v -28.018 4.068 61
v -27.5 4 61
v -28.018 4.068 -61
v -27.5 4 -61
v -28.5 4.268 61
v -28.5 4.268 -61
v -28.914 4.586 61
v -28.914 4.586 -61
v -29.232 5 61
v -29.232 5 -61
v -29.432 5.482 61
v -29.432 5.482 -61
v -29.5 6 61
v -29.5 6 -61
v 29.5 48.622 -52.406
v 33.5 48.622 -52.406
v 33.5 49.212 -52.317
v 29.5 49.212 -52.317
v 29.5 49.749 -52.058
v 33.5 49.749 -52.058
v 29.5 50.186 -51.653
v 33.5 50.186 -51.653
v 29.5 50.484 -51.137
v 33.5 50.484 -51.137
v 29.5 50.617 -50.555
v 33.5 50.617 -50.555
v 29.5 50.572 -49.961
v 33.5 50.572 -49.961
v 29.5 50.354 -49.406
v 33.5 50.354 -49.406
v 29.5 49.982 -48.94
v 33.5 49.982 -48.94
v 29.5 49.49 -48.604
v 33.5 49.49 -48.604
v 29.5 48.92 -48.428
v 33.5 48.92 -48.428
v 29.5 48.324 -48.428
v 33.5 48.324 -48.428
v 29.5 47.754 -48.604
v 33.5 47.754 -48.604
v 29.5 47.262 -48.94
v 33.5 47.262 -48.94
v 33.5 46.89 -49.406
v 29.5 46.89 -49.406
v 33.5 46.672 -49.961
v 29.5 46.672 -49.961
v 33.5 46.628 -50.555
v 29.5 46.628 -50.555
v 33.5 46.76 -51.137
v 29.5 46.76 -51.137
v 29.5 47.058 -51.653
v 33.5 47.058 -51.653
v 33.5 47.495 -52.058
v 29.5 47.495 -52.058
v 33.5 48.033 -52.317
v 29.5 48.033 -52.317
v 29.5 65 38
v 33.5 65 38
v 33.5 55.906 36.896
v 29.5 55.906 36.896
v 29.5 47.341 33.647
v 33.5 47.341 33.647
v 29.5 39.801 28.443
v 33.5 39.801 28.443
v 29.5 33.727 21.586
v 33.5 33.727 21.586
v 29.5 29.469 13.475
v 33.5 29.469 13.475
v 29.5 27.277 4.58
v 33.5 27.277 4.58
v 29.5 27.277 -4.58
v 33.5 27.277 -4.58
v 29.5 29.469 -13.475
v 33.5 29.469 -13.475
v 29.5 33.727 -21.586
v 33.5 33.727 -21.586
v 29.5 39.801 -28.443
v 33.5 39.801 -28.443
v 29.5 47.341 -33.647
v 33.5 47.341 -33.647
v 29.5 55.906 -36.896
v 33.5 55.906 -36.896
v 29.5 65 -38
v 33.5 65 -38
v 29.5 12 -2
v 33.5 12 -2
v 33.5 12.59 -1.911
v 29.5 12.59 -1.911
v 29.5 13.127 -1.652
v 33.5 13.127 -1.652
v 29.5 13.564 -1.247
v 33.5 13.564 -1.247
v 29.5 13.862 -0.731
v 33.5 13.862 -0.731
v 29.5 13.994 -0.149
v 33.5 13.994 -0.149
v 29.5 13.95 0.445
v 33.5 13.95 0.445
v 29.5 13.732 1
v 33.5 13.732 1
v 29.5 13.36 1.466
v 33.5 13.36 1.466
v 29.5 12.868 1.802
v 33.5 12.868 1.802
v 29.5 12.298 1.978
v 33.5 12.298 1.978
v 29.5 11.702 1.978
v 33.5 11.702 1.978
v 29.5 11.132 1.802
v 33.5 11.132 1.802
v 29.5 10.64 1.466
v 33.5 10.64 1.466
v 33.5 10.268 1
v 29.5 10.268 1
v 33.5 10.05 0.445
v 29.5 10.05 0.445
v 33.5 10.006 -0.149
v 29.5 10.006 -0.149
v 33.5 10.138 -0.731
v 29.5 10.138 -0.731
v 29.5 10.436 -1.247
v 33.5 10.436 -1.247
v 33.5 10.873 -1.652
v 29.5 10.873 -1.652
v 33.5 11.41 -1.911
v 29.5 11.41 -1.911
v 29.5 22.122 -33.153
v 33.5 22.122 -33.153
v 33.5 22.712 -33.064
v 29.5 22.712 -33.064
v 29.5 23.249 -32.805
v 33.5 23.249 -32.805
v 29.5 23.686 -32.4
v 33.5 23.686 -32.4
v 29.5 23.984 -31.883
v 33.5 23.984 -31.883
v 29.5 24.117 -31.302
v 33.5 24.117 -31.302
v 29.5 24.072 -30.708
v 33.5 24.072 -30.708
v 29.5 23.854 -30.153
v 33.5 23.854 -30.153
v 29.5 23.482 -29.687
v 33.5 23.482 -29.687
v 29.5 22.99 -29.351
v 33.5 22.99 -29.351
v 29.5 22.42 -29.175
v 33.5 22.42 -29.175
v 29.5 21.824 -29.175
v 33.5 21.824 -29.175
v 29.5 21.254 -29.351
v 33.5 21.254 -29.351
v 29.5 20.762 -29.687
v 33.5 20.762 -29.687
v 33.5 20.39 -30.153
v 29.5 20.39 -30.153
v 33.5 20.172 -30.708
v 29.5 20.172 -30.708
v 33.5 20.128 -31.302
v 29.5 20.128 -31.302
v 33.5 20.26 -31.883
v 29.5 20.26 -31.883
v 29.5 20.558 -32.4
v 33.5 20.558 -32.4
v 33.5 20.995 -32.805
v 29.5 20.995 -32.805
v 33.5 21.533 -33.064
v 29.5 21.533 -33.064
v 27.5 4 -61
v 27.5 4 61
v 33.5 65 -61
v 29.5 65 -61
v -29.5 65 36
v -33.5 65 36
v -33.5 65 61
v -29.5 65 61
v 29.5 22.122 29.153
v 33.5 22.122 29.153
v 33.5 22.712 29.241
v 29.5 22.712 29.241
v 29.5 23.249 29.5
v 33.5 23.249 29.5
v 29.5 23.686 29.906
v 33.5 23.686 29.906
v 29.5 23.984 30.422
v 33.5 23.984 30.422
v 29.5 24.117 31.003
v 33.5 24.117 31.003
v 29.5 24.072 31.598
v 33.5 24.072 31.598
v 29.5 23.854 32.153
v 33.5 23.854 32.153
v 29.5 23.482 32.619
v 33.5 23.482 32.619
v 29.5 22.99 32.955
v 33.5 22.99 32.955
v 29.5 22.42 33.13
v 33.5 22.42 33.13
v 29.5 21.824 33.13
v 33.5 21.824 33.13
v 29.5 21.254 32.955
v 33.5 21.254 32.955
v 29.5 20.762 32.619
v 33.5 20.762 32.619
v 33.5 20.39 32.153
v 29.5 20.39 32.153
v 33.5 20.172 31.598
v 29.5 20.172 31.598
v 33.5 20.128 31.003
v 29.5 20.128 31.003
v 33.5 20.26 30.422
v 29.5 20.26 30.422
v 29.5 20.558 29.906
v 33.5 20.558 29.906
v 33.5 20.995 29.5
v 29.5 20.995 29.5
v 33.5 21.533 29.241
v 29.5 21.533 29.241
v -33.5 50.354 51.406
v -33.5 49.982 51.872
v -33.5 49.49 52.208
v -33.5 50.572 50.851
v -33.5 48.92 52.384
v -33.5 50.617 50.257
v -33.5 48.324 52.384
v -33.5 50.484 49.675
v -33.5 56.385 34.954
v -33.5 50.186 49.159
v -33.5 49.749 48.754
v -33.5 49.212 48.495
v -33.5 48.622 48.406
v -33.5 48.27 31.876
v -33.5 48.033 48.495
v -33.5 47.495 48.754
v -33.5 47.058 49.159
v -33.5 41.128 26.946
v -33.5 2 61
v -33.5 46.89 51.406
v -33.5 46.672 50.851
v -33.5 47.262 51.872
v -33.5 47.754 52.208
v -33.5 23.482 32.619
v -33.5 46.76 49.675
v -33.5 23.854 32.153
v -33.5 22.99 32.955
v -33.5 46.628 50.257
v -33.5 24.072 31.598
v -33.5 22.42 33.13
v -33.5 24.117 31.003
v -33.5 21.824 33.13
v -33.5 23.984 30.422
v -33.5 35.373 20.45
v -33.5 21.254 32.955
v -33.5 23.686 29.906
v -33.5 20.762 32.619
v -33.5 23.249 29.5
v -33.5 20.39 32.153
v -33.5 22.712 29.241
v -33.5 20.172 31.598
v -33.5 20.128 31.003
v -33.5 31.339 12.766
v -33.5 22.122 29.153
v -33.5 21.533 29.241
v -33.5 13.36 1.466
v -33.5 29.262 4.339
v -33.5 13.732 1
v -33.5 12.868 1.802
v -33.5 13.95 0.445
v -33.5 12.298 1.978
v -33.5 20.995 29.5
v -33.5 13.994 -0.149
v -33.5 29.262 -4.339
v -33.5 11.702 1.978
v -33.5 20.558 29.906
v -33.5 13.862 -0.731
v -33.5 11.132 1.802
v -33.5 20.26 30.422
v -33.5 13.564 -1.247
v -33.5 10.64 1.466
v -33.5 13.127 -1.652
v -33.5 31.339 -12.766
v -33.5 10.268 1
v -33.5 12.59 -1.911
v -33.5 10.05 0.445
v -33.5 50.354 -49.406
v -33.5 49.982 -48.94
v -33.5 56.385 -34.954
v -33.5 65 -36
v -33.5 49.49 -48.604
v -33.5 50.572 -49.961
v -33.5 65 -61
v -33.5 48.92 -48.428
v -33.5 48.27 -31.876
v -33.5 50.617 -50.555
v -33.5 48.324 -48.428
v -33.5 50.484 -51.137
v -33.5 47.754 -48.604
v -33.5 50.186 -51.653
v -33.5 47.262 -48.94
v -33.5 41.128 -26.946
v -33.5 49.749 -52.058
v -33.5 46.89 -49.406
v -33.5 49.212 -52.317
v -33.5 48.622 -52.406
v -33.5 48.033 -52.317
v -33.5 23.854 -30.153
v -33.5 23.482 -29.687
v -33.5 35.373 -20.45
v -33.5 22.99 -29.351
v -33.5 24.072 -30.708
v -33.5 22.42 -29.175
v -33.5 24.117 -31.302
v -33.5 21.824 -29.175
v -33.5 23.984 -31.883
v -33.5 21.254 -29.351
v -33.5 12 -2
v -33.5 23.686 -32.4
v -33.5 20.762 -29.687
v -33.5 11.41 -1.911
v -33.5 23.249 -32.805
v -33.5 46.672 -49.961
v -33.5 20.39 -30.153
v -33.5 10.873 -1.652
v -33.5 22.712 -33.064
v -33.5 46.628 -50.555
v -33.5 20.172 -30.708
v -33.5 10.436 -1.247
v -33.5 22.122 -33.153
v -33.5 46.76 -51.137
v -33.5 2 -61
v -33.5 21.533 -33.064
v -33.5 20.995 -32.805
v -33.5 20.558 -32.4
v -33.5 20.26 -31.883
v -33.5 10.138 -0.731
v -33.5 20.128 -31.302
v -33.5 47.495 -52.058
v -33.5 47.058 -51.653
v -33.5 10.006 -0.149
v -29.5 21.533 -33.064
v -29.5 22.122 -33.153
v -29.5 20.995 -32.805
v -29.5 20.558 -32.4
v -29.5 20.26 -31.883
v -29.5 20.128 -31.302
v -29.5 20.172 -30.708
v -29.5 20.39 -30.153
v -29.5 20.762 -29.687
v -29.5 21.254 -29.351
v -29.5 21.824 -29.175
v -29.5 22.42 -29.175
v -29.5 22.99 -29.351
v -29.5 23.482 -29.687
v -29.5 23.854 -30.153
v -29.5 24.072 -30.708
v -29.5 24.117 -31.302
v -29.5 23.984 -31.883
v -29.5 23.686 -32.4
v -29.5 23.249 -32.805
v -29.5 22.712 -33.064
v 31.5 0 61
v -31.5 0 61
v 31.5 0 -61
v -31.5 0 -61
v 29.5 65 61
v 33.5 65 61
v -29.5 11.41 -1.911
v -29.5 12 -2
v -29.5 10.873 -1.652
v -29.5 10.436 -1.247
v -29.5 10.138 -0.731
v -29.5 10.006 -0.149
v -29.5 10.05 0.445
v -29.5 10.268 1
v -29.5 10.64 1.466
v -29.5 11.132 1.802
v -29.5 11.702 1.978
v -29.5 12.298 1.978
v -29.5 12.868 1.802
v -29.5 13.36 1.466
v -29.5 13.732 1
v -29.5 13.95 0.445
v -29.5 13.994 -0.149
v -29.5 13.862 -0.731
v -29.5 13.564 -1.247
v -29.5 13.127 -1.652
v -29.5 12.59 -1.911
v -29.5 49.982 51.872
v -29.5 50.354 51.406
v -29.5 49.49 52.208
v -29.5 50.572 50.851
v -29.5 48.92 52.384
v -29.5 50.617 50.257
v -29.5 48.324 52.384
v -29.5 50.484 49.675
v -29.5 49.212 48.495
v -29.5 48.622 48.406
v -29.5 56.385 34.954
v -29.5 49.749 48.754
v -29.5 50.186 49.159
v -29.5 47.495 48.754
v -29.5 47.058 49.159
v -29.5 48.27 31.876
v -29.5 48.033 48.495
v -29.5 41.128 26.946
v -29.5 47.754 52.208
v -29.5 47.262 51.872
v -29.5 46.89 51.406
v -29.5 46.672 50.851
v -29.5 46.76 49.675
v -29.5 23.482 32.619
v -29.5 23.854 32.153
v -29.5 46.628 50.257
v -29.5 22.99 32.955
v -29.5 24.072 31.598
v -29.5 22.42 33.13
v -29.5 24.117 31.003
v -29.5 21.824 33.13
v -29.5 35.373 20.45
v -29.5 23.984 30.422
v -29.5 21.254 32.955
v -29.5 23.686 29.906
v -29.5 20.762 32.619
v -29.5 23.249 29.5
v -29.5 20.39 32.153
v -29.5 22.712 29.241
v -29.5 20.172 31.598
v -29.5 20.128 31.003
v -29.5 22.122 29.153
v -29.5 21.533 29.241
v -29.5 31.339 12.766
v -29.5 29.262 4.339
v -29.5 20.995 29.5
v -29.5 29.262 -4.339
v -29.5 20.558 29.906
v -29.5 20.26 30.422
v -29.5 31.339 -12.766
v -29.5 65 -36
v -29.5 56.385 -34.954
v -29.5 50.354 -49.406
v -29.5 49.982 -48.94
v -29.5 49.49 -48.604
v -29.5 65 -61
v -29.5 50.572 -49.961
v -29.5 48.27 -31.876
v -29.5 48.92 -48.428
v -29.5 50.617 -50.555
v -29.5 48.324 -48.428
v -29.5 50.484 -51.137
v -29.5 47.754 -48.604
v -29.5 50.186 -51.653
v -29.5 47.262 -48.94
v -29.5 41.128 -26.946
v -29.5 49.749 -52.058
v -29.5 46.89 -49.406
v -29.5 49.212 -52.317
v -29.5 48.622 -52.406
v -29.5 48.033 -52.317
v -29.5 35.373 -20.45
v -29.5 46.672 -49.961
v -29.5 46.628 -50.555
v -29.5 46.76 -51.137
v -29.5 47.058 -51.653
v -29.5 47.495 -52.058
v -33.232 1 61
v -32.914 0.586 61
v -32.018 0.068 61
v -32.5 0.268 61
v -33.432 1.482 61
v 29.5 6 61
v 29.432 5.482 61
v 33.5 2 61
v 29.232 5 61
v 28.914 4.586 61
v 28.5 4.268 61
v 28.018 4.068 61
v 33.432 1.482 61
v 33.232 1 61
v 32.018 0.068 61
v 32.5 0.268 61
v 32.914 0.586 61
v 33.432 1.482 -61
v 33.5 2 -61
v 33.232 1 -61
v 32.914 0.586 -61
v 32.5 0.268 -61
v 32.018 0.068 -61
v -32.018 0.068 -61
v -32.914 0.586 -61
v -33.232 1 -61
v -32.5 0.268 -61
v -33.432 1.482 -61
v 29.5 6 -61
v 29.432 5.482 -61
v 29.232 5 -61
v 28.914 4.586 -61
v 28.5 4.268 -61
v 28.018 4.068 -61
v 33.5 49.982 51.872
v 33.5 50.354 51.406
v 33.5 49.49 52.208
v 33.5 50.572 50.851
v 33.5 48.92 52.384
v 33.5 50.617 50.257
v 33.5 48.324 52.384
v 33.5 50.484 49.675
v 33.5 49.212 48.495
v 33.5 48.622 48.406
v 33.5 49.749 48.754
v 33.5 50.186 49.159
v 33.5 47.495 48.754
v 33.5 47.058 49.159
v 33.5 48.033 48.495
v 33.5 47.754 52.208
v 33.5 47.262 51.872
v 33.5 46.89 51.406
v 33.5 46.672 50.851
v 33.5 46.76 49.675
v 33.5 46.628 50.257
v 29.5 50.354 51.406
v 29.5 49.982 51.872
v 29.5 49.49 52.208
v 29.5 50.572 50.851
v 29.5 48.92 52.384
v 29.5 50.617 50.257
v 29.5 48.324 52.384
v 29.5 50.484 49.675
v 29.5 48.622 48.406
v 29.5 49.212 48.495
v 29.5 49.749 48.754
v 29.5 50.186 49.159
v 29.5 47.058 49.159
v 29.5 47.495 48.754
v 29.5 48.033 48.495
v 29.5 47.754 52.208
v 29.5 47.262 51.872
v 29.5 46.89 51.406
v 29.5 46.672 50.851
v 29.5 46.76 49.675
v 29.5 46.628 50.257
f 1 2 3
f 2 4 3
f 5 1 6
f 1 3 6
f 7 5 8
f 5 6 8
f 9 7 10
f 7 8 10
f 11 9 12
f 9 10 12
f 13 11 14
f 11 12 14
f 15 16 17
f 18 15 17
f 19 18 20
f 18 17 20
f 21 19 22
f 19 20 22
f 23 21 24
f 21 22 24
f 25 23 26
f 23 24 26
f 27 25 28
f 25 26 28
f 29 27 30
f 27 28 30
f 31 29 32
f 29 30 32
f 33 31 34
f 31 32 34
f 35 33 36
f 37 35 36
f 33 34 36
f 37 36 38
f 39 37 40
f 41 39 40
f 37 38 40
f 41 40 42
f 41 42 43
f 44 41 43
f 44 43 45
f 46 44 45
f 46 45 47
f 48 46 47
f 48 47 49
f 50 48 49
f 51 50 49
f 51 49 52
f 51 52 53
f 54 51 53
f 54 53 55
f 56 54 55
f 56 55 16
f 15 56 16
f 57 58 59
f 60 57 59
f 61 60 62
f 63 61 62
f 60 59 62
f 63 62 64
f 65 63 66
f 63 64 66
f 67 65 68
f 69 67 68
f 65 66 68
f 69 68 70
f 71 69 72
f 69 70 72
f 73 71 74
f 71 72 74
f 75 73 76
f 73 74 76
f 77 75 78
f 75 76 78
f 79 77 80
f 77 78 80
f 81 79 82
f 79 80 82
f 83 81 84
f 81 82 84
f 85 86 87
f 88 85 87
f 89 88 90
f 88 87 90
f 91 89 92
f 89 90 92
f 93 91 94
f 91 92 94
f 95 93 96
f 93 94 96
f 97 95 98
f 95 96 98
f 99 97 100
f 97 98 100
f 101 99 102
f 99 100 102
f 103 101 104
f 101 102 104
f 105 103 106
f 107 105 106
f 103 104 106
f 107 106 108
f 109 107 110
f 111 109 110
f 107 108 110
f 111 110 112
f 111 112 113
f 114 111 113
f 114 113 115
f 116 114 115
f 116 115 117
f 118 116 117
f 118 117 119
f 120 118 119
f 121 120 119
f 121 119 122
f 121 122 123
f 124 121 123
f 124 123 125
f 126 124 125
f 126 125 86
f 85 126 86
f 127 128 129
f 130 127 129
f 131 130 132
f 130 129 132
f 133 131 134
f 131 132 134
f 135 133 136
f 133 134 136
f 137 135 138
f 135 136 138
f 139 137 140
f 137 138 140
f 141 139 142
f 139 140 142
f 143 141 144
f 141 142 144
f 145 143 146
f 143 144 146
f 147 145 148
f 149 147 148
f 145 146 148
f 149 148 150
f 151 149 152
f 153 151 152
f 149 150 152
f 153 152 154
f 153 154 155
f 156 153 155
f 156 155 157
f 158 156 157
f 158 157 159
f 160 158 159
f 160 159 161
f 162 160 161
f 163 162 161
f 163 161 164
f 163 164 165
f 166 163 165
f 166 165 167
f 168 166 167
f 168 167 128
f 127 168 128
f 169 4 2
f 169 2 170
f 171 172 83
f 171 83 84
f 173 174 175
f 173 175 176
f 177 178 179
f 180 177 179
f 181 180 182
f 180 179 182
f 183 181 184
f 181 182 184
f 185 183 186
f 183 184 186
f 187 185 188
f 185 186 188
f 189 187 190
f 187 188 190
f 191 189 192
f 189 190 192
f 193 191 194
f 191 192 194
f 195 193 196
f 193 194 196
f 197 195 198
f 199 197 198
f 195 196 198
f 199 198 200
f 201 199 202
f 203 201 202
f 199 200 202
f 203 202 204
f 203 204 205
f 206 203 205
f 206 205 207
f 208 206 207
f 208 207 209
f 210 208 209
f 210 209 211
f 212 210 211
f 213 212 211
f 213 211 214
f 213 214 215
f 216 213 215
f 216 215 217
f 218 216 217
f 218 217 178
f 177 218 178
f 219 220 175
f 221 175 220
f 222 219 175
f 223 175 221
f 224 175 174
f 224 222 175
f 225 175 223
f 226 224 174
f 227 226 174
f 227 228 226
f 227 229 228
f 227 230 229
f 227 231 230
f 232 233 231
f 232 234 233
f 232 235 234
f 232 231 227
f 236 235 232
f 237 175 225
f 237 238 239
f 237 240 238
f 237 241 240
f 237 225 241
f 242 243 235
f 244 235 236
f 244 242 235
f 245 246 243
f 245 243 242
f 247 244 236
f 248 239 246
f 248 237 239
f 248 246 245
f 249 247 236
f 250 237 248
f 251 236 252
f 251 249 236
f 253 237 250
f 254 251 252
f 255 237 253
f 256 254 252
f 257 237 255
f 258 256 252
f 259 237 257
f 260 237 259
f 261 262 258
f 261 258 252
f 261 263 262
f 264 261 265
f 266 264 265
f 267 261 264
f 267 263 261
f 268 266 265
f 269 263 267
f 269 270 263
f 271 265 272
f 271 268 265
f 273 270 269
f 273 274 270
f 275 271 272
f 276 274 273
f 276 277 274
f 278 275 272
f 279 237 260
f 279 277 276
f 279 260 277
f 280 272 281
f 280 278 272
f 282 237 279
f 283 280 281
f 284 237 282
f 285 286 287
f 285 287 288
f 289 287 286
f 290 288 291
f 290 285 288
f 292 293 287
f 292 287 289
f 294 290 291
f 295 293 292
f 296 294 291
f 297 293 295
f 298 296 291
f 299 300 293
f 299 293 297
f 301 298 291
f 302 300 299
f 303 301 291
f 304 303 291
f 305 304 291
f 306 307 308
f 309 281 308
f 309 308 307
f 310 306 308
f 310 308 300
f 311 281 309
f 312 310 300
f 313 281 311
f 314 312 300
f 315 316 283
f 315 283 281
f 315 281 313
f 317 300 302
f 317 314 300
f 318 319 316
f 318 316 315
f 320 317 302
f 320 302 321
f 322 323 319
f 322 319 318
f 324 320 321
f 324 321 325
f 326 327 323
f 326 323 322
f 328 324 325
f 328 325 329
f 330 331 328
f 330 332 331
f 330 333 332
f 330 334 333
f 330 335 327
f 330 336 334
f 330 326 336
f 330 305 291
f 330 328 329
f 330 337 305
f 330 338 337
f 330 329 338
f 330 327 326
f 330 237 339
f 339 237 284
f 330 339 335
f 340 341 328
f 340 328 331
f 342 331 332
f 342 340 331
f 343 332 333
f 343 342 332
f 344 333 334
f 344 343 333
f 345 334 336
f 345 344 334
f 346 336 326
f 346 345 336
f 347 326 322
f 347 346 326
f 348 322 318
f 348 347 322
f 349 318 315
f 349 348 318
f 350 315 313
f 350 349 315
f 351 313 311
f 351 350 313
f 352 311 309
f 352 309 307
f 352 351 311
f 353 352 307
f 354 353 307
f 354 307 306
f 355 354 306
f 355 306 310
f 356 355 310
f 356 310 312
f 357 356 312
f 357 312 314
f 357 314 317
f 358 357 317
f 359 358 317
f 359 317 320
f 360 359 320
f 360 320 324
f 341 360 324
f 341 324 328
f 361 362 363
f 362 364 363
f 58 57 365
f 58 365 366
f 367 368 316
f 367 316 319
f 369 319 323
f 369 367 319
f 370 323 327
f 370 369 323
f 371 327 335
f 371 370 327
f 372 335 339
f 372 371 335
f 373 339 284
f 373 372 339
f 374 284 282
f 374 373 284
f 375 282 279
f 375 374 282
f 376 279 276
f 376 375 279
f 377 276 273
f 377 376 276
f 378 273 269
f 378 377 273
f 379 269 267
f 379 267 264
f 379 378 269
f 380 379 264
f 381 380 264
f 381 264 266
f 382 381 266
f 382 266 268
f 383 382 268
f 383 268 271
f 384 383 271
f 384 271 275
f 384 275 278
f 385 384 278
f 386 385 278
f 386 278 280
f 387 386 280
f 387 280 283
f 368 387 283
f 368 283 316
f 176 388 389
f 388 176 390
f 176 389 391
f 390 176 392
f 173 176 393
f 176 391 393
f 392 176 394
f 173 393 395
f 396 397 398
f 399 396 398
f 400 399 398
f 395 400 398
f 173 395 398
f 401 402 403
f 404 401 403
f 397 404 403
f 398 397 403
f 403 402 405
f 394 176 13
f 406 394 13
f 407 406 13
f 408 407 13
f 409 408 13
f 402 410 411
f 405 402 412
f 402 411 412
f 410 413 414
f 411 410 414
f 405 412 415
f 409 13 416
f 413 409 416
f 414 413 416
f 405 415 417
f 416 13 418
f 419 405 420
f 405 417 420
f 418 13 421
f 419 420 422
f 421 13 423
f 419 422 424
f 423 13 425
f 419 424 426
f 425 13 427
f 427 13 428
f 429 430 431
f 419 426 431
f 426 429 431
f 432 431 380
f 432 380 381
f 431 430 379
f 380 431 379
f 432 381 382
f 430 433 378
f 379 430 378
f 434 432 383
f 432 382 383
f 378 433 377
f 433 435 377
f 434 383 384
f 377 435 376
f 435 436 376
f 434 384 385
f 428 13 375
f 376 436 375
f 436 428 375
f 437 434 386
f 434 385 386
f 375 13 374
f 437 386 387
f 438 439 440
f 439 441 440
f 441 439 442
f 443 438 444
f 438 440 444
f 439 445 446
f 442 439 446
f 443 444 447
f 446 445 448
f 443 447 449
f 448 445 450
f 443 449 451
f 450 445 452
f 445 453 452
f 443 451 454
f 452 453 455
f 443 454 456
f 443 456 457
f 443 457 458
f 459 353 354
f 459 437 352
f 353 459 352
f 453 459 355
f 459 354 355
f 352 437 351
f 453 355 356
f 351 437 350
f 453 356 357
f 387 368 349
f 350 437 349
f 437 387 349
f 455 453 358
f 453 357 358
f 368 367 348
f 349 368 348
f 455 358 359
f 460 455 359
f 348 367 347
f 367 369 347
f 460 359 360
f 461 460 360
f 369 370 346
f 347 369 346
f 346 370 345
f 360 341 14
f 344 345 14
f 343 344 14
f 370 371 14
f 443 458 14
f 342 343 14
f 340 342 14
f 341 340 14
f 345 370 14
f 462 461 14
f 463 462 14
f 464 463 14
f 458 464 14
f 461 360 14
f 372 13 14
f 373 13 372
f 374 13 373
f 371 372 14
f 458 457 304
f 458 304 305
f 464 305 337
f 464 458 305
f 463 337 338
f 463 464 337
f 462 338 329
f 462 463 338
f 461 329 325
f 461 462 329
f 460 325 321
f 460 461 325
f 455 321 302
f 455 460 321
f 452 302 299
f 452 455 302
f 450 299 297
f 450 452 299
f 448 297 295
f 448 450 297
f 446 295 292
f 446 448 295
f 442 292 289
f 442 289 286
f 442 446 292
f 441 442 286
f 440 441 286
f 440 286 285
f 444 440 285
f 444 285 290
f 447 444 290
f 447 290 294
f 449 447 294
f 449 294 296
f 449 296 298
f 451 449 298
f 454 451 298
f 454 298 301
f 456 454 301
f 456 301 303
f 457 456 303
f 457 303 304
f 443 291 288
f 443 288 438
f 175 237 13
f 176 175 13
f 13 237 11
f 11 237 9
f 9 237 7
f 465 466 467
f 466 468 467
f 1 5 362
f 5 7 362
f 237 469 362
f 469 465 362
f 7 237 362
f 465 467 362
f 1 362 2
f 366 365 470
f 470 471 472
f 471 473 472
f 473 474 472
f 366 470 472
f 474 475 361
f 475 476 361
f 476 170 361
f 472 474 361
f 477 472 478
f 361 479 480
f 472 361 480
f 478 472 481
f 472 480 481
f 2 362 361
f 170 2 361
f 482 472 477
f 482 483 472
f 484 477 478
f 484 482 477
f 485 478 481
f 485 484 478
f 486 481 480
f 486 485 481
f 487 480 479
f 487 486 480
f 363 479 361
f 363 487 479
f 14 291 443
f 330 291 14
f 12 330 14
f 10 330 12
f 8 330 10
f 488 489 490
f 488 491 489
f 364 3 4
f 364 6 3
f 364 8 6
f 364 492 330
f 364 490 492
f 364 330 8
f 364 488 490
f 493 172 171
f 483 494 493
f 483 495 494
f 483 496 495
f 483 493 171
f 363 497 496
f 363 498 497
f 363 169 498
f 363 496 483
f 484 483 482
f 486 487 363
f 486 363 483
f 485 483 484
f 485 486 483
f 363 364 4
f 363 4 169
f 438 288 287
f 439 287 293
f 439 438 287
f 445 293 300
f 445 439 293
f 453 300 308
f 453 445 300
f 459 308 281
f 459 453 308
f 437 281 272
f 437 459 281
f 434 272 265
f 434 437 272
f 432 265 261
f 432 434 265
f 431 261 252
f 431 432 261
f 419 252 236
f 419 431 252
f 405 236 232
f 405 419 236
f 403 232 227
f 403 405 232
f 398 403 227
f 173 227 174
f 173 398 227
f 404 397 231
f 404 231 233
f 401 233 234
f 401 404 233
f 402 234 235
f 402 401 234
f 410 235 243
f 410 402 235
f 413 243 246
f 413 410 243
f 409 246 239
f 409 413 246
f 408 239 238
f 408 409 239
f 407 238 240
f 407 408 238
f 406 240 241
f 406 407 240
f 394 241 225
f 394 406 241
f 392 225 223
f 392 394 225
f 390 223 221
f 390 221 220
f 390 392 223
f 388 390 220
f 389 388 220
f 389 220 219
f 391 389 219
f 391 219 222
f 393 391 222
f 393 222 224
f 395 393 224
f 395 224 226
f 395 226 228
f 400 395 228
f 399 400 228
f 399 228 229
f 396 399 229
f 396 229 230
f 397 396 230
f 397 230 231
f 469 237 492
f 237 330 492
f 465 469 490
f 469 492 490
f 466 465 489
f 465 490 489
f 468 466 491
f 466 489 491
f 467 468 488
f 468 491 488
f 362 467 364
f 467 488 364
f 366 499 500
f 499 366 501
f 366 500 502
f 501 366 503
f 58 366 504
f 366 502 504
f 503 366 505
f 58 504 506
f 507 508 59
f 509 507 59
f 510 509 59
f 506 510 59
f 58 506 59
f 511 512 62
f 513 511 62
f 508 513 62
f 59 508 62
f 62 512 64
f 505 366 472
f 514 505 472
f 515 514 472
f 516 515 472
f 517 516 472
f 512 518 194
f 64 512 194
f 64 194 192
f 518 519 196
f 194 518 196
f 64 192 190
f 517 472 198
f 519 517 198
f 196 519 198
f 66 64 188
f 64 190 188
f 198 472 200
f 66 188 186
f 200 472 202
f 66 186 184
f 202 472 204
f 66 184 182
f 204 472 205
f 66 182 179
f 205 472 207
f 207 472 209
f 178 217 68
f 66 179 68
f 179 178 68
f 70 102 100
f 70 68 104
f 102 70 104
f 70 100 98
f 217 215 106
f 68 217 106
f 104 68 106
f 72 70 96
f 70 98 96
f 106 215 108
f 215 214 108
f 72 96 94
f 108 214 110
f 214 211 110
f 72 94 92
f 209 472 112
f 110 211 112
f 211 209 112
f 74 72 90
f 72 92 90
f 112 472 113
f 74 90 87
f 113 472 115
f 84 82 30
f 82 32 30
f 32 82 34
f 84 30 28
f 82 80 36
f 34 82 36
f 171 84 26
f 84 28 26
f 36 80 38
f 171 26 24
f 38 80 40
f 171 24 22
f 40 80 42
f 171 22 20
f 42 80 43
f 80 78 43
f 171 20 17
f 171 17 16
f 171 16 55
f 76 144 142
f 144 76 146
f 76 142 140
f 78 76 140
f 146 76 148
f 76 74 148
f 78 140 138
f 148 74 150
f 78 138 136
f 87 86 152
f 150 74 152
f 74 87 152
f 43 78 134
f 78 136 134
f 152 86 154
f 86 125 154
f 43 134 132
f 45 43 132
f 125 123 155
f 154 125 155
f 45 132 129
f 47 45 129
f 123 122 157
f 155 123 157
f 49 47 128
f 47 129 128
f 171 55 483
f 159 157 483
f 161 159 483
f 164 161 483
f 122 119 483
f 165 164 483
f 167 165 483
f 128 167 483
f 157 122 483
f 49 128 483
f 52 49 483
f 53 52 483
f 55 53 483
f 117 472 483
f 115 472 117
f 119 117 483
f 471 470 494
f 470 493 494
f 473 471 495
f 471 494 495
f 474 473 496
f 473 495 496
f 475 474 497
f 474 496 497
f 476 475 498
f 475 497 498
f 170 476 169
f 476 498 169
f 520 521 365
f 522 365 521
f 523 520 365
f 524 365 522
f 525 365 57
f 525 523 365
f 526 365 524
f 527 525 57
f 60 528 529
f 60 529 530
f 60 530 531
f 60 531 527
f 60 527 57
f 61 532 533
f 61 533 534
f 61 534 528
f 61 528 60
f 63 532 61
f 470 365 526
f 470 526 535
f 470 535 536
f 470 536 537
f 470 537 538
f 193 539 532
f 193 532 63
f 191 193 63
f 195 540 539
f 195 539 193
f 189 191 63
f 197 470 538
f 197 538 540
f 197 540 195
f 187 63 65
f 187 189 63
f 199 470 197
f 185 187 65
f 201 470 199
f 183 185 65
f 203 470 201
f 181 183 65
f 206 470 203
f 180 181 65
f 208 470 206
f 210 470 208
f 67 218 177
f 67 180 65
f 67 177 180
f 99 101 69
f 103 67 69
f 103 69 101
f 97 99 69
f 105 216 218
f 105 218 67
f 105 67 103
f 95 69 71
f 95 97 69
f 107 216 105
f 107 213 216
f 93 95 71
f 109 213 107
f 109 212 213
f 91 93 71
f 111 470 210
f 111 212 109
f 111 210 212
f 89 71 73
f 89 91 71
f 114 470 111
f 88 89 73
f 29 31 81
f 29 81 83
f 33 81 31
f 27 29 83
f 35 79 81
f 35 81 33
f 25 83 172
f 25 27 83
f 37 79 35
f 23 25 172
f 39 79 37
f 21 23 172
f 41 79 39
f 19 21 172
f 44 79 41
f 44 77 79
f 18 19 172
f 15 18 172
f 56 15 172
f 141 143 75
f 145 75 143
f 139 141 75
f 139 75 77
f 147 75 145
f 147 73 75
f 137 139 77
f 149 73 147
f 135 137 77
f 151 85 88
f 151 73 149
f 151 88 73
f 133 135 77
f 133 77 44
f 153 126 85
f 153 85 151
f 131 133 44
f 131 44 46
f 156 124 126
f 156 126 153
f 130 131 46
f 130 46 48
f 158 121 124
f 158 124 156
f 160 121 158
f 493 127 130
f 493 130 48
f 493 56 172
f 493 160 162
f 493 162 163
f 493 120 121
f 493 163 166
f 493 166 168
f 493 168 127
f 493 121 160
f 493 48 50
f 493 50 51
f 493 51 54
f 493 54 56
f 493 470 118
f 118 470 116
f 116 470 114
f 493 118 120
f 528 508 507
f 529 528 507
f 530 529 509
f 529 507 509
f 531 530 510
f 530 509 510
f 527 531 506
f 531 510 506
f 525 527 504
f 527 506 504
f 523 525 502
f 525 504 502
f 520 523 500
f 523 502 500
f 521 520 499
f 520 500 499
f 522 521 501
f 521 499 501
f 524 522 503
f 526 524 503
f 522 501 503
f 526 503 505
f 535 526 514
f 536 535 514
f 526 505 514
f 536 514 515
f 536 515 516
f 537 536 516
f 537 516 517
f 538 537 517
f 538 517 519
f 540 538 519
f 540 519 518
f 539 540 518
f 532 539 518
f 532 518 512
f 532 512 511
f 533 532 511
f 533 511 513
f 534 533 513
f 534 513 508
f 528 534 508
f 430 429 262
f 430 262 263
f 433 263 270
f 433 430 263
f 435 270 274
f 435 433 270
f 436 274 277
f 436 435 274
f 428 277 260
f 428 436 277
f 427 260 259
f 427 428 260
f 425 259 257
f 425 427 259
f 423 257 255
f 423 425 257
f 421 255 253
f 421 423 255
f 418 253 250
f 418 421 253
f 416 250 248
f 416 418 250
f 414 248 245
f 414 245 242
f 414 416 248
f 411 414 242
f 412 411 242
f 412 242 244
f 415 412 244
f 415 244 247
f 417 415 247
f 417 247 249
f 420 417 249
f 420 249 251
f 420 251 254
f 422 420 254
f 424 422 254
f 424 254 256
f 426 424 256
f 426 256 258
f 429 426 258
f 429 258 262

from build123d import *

# Parameters (mm, degrees)
SKETCH_1_W          = 67
SKETCH_1_H          = 122
EXTRUDE_1_DEPTH     = 4
SKETCH_2_W          = 4
SKETCH_2_H          = 122
EXTRUDE_2_DEPTH     = 61
FILLET_1_R          = 2
SKETCH_4_R          = 38
SKETCH_4_R_2        = 2
CUT_EXTRUDE_1_DEPTH = 11
CUT_EXTRUDE_START   = -11
SKETCH_5_R          = 36
SKETCH_5_R_2        = 2
CUT_EXTRUDE_2_DEPTH = 11


with BuildPart() as part:
    # Эскиз1 → Бобышка-Вытянуть1 (new body)
    with BuildSketch(Plane(origin=(0, 0, 0), x_dir=(1, 0, 0), z_dir=(0, 1, 0))):
        Rectangle(SKETCH_1_W, SKETCH_1_H)
    extrude(amount=EXTRUDE_1_DEPTH)

    # Эскиз2 → Бобышка-Вытянуть2 (add)
    with BuildSketch(Plane(origin=(0, 4, 0), x_dir=(1, 0, 0), z_dir=(0, 1, 0))):
        with Locations((-31.5, 0)):
            Rectangle(SKETCH_2_W, SKETCH_2_H)
        with Locations((31.5, 0)):
            Rectangle(SKETCH_2_W, SKETCH_2_H)
    extrude(amount=EXTRUDE_2_DEPTH)

    # Скругление1
    fillet_1_edges = [part.edges().sort_by_distance(p)[0] for p in [
        (-29.5, 4, 0),
        (29.5, 4, 0),
        (33.5, 0, 0),
        (-33.5, 0, 0),
    ]]
    fillet(fillet_1_edges, radius=FILLET_1_R)

    # Эскиз4 → Вырез-Вытянуть1 (cut)
    with BuildSketch(Plane(origin=(33.5, 0, 0), x_dir=(0, 0, -1), z_dir=(1, 0, 0))):
        with Locations((0, 65)):
            Circle(SKETCH_4_R)
        with Locations((0, 12)):
            Circle(SKETCH_4_R_2)
        with Locations((-31.152618372, 22.122099298)):
            Circle(SKETCH_4_R_2)
        with Locations((-50.405995364, 48.622099298)):
            Circle(SKETCH_4_R_2)
        with Locations((50.405995364, 48.622099298)):
            Circle(SKETCH_4_R_2)
        with Locations((31.152618372, 22.122099298)):
            Circle(SKETCH_4_R_2)
    extrude(amount=-CUT_EXTRUDE_1_DEPTH, mode=Mode.SUBTRACT)

    # Эскиз5 → Вырез-Вытянуть2 (cut)
    with BuildSketch(Plane.ZY.offset(33.5).offset(CUT_EXTRUDE_START)):
        with Locations((0, 65)):
            Circle(SKETCH_5_R)
        with Locations(Location((0, 12, 0), (0, 0, 180))):
            Circle(SKETCH_5_R_2)
        with Locations(Location((-31.152618372, 22.122099298, 0), (0, 0, 180))):
            Circle(SKETCH_5_R_2)
        with Locations(Location((-50.405995364, 48.622099298, 0), (0, 0, 180))):
            Circle(SKETCH_5_R_2)
        with Locations(Location((50.405995364, 48.622099298, 0), (0, 0, 180))):
            Circle(SKETCH_5_R_2)
        with Locations(Location((31.152618372, 22.122099298, 0), (0, 0, 180))):
            Circle(SKETCH_5_R_2)
    extrude(amount=CUT_EXTRUDE_2_DEPTH, mode=Mode.SUBTRACT)


solid = part.part
